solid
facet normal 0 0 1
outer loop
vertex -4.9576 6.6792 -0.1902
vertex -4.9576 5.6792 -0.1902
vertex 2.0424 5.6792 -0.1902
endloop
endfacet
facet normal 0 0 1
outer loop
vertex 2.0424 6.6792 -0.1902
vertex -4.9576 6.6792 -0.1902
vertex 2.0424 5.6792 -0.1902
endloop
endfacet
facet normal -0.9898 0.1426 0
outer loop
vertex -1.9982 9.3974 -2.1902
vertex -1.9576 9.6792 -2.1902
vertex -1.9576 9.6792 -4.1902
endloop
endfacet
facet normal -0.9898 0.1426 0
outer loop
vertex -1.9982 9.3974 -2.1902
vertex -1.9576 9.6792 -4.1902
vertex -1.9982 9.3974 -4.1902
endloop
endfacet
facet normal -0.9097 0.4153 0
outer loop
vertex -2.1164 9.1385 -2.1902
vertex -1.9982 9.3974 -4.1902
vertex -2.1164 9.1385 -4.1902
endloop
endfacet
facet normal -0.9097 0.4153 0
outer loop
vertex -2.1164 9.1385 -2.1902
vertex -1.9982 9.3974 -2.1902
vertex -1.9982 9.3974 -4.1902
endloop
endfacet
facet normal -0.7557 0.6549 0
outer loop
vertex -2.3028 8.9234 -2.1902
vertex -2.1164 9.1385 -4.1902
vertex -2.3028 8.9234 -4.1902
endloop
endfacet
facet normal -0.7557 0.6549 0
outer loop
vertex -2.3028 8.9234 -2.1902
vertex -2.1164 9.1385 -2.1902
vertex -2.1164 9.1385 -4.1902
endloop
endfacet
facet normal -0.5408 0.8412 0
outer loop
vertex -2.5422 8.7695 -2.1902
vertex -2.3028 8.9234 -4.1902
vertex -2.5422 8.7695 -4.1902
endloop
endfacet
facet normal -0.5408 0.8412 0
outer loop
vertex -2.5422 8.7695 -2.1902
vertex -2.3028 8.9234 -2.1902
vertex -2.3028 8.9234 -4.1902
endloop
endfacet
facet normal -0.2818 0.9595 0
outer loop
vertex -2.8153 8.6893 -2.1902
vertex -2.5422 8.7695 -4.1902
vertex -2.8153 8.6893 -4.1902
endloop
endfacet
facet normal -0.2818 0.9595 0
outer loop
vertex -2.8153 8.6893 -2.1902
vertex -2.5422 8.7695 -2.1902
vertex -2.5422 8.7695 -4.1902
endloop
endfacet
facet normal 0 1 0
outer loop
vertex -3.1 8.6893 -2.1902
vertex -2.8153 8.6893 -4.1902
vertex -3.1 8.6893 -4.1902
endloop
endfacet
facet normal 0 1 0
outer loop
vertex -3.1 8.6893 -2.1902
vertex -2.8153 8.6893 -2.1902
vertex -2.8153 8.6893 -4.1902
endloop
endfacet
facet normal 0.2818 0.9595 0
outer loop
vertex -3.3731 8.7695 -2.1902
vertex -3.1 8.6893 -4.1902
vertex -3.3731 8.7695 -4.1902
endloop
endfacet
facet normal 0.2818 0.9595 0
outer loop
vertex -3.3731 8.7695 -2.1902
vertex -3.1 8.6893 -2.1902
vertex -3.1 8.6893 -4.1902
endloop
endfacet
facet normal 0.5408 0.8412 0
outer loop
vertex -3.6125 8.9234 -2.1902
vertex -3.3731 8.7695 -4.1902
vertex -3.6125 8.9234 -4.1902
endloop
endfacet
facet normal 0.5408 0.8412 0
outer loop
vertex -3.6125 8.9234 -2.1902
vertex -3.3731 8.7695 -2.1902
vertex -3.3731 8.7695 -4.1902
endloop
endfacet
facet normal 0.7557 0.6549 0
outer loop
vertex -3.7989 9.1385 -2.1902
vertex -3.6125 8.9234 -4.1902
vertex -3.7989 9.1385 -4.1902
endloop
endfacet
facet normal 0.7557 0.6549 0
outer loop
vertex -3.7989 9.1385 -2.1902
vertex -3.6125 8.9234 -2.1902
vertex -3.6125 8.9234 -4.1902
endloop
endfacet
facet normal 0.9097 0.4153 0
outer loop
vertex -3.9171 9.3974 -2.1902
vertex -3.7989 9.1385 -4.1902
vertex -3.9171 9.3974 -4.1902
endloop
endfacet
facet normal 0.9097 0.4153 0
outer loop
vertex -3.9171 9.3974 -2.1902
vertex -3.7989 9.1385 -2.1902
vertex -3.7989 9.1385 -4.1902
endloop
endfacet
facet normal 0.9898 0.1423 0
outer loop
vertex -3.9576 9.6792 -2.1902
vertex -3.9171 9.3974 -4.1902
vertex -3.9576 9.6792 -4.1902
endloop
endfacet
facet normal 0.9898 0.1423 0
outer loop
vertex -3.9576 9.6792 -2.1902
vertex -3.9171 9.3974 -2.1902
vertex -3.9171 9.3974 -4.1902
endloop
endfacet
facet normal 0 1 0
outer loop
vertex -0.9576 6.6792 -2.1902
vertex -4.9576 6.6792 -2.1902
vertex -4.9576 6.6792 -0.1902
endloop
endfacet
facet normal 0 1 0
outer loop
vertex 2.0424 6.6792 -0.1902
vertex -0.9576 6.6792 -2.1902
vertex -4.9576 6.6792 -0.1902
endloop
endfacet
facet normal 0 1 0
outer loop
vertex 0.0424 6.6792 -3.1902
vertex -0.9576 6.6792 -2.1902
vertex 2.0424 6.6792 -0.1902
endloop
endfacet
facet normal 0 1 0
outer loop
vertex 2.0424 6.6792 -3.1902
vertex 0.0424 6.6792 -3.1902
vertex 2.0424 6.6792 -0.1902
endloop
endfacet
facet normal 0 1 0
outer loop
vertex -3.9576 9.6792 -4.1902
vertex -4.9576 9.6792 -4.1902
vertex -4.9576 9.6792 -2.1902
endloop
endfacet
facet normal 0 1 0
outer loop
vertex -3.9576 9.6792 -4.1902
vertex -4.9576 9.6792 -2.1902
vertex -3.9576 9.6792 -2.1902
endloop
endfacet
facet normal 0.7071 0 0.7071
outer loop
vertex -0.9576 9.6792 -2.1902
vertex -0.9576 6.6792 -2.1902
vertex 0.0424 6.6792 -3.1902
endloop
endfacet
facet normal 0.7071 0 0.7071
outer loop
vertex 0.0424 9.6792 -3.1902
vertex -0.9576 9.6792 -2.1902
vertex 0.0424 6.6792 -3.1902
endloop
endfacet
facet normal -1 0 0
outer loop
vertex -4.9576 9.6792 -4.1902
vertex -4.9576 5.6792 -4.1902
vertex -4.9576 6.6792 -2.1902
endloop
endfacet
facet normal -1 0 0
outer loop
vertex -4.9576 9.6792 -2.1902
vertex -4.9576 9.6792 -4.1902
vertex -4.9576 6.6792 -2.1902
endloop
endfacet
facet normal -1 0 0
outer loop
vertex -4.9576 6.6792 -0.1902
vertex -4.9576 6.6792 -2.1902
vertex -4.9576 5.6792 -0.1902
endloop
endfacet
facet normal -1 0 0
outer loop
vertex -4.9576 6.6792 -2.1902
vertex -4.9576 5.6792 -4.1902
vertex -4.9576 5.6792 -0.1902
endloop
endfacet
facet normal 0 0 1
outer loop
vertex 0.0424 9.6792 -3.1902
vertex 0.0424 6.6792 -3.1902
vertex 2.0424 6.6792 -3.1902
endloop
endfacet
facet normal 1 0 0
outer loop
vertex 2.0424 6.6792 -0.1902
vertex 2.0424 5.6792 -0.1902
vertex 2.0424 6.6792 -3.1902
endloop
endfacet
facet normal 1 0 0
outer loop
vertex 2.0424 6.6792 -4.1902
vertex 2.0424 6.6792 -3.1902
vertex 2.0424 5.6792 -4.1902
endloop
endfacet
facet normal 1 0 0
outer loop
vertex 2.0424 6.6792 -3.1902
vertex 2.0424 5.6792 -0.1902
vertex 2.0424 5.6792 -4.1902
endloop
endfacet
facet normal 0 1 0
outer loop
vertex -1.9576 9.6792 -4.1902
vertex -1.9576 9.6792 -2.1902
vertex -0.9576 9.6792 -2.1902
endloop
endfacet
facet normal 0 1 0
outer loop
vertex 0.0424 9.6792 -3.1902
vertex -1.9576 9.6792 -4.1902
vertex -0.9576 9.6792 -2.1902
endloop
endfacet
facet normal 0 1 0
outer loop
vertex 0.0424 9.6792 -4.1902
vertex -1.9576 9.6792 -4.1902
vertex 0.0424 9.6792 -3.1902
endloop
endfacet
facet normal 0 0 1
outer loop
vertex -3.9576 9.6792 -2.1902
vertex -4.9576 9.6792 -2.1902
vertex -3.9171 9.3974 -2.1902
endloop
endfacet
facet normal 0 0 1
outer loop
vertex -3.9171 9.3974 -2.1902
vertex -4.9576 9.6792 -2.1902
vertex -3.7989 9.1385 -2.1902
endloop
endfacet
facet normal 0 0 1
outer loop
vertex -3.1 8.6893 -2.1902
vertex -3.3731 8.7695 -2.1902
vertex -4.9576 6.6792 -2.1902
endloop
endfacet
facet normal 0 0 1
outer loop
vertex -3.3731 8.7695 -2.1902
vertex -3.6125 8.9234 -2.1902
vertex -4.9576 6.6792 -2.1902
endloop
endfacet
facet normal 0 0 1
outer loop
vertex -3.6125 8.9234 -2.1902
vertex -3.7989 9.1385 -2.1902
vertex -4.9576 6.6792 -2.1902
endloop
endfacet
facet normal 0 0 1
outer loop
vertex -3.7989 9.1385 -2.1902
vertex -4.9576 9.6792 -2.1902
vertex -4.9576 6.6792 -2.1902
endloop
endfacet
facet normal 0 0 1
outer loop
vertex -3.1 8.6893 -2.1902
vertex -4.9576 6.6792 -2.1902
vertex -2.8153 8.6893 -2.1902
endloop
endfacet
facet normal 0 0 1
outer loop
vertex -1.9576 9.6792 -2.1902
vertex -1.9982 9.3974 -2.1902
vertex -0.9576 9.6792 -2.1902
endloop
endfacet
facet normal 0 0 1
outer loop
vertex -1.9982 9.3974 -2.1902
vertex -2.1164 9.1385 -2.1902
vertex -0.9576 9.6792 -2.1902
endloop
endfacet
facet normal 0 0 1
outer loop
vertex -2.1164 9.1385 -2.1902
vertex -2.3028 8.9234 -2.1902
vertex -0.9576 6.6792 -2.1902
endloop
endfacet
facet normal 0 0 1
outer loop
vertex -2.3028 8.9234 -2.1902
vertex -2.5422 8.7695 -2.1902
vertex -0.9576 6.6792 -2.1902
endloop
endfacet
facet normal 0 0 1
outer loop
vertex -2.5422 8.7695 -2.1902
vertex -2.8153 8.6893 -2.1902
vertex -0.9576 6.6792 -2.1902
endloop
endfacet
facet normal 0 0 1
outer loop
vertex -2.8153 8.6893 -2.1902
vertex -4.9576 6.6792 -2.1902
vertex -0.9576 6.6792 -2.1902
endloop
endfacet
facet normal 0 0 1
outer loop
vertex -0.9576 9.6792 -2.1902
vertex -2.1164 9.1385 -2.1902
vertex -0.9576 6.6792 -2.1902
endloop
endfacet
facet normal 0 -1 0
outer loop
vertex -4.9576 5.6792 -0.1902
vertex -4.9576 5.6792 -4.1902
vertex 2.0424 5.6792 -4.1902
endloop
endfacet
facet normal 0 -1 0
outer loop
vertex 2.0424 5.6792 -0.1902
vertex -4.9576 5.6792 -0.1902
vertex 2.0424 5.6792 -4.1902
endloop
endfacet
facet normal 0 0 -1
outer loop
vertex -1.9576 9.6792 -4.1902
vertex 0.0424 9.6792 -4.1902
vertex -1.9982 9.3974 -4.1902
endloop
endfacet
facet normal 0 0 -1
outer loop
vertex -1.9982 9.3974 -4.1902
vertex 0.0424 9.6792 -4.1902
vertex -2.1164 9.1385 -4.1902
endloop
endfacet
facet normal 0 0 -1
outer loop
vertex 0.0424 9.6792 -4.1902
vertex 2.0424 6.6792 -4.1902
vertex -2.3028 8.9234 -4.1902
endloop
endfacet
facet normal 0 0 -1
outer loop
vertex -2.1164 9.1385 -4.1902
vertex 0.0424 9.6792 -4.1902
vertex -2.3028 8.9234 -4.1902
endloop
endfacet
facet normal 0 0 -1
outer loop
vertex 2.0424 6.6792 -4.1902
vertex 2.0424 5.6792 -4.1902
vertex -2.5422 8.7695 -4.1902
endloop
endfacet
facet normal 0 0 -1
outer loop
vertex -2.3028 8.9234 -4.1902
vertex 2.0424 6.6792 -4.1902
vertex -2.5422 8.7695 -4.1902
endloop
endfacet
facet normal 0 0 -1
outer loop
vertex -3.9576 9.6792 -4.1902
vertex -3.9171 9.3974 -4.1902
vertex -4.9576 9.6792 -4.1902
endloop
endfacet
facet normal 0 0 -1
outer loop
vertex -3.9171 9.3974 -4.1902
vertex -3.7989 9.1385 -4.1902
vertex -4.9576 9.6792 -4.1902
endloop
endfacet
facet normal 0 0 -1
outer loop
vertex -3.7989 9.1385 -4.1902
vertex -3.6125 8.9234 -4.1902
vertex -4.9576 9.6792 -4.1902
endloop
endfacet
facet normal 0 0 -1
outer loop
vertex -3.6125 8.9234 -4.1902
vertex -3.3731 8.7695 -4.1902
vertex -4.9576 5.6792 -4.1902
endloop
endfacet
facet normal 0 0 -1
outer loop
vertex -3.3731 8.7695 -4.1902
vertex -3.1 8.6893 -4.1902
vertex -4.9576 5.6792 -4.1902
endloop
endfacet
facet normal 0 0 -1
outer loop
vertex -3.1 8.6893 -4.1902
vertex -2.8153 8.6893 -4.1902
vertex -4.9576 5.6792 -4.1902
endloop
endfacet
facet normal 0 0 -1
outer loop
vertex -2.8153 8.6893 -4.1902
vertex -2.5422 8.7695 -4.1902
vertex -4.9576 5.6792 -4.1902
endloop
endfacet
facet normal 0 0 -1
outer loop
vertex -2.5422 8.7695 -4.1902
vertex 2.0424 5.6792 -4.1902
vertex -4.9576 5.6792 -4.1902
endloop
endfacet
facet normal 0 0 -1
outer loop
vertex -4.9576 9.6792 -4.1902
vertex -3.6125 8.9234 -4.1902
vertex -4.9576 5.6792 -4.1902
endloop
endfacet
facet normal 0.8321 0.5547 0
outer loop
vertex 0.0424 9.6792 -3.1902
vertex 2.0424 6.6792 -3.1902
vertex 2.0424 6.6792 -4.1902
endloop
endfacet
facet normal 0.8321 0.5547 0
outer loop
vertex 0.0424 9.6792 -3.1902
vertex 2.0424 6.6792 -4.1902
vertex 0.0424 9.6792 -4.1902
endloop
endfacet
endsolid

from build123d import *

# Parameters (mm, degrees)
SKETCH_1_W          = 35
SKETCH_1_H          = 20
EXTRUDE_1_DEPTH     = 5
EXTRUDE_2_DEPTH     = 20
CUT_EXTRUDE_1_DEPTH = 20
SCALE_1_SCALE       = 0.2


with BuildPart() as part:
    # 草圖1 → 填料-伸長1 (new body)
    with BuildSketch(Plane(origin=(0, 0, 0), x_dir=(1, 0, 0), z_dir=(0, 1, 0))):
        Rectangle(SKETCH_1_W, SKETCH_1_H)
    extrude(amount=EXTRUDE_1_DEPTH)

    # 草圖1<3> → 填料-伸長2 (add)
    with BuildSketch(Plane(origin=(0, 0, 0), x_dir=(1, 0, 0), z_dir=(0, 1, 0))):
        Polygon((2.5, 0), (7.5, 5), (17.5, 5), (17.5, 10), (-17.5, 10), (-17.5, 0), align=None)
    extrude(amount=EXTRUDE_2_DEPTH)

    # 草圖2 → 除料-伸長1 (cut)
    with BuildSketch(Plane.XY):
        with BuildLine():
            Line((-12.5, 20), (-2.5, 20))
            ThreePointArc((-2.5, 20), (-7.5, 15), (-12.5, 20))
        make_face()
        Polygon((17.5, 5), (7.5, 20), (17.5, 20), align=None)
    extrude(amount=-CUT_EXTRUDE_1_DEPTH, mode=Mode.SUBTRACT)


with BuildPart() as part_1:
    # 縮放比例1: scaled about (-1.822053886, 7.09893754, -2.737693345)
    add(part.part.scale(SCALE_1_SCALE).moved(Location((-1.457643109, 5.679150032, -2.190154676))))


solid = part_1.part
